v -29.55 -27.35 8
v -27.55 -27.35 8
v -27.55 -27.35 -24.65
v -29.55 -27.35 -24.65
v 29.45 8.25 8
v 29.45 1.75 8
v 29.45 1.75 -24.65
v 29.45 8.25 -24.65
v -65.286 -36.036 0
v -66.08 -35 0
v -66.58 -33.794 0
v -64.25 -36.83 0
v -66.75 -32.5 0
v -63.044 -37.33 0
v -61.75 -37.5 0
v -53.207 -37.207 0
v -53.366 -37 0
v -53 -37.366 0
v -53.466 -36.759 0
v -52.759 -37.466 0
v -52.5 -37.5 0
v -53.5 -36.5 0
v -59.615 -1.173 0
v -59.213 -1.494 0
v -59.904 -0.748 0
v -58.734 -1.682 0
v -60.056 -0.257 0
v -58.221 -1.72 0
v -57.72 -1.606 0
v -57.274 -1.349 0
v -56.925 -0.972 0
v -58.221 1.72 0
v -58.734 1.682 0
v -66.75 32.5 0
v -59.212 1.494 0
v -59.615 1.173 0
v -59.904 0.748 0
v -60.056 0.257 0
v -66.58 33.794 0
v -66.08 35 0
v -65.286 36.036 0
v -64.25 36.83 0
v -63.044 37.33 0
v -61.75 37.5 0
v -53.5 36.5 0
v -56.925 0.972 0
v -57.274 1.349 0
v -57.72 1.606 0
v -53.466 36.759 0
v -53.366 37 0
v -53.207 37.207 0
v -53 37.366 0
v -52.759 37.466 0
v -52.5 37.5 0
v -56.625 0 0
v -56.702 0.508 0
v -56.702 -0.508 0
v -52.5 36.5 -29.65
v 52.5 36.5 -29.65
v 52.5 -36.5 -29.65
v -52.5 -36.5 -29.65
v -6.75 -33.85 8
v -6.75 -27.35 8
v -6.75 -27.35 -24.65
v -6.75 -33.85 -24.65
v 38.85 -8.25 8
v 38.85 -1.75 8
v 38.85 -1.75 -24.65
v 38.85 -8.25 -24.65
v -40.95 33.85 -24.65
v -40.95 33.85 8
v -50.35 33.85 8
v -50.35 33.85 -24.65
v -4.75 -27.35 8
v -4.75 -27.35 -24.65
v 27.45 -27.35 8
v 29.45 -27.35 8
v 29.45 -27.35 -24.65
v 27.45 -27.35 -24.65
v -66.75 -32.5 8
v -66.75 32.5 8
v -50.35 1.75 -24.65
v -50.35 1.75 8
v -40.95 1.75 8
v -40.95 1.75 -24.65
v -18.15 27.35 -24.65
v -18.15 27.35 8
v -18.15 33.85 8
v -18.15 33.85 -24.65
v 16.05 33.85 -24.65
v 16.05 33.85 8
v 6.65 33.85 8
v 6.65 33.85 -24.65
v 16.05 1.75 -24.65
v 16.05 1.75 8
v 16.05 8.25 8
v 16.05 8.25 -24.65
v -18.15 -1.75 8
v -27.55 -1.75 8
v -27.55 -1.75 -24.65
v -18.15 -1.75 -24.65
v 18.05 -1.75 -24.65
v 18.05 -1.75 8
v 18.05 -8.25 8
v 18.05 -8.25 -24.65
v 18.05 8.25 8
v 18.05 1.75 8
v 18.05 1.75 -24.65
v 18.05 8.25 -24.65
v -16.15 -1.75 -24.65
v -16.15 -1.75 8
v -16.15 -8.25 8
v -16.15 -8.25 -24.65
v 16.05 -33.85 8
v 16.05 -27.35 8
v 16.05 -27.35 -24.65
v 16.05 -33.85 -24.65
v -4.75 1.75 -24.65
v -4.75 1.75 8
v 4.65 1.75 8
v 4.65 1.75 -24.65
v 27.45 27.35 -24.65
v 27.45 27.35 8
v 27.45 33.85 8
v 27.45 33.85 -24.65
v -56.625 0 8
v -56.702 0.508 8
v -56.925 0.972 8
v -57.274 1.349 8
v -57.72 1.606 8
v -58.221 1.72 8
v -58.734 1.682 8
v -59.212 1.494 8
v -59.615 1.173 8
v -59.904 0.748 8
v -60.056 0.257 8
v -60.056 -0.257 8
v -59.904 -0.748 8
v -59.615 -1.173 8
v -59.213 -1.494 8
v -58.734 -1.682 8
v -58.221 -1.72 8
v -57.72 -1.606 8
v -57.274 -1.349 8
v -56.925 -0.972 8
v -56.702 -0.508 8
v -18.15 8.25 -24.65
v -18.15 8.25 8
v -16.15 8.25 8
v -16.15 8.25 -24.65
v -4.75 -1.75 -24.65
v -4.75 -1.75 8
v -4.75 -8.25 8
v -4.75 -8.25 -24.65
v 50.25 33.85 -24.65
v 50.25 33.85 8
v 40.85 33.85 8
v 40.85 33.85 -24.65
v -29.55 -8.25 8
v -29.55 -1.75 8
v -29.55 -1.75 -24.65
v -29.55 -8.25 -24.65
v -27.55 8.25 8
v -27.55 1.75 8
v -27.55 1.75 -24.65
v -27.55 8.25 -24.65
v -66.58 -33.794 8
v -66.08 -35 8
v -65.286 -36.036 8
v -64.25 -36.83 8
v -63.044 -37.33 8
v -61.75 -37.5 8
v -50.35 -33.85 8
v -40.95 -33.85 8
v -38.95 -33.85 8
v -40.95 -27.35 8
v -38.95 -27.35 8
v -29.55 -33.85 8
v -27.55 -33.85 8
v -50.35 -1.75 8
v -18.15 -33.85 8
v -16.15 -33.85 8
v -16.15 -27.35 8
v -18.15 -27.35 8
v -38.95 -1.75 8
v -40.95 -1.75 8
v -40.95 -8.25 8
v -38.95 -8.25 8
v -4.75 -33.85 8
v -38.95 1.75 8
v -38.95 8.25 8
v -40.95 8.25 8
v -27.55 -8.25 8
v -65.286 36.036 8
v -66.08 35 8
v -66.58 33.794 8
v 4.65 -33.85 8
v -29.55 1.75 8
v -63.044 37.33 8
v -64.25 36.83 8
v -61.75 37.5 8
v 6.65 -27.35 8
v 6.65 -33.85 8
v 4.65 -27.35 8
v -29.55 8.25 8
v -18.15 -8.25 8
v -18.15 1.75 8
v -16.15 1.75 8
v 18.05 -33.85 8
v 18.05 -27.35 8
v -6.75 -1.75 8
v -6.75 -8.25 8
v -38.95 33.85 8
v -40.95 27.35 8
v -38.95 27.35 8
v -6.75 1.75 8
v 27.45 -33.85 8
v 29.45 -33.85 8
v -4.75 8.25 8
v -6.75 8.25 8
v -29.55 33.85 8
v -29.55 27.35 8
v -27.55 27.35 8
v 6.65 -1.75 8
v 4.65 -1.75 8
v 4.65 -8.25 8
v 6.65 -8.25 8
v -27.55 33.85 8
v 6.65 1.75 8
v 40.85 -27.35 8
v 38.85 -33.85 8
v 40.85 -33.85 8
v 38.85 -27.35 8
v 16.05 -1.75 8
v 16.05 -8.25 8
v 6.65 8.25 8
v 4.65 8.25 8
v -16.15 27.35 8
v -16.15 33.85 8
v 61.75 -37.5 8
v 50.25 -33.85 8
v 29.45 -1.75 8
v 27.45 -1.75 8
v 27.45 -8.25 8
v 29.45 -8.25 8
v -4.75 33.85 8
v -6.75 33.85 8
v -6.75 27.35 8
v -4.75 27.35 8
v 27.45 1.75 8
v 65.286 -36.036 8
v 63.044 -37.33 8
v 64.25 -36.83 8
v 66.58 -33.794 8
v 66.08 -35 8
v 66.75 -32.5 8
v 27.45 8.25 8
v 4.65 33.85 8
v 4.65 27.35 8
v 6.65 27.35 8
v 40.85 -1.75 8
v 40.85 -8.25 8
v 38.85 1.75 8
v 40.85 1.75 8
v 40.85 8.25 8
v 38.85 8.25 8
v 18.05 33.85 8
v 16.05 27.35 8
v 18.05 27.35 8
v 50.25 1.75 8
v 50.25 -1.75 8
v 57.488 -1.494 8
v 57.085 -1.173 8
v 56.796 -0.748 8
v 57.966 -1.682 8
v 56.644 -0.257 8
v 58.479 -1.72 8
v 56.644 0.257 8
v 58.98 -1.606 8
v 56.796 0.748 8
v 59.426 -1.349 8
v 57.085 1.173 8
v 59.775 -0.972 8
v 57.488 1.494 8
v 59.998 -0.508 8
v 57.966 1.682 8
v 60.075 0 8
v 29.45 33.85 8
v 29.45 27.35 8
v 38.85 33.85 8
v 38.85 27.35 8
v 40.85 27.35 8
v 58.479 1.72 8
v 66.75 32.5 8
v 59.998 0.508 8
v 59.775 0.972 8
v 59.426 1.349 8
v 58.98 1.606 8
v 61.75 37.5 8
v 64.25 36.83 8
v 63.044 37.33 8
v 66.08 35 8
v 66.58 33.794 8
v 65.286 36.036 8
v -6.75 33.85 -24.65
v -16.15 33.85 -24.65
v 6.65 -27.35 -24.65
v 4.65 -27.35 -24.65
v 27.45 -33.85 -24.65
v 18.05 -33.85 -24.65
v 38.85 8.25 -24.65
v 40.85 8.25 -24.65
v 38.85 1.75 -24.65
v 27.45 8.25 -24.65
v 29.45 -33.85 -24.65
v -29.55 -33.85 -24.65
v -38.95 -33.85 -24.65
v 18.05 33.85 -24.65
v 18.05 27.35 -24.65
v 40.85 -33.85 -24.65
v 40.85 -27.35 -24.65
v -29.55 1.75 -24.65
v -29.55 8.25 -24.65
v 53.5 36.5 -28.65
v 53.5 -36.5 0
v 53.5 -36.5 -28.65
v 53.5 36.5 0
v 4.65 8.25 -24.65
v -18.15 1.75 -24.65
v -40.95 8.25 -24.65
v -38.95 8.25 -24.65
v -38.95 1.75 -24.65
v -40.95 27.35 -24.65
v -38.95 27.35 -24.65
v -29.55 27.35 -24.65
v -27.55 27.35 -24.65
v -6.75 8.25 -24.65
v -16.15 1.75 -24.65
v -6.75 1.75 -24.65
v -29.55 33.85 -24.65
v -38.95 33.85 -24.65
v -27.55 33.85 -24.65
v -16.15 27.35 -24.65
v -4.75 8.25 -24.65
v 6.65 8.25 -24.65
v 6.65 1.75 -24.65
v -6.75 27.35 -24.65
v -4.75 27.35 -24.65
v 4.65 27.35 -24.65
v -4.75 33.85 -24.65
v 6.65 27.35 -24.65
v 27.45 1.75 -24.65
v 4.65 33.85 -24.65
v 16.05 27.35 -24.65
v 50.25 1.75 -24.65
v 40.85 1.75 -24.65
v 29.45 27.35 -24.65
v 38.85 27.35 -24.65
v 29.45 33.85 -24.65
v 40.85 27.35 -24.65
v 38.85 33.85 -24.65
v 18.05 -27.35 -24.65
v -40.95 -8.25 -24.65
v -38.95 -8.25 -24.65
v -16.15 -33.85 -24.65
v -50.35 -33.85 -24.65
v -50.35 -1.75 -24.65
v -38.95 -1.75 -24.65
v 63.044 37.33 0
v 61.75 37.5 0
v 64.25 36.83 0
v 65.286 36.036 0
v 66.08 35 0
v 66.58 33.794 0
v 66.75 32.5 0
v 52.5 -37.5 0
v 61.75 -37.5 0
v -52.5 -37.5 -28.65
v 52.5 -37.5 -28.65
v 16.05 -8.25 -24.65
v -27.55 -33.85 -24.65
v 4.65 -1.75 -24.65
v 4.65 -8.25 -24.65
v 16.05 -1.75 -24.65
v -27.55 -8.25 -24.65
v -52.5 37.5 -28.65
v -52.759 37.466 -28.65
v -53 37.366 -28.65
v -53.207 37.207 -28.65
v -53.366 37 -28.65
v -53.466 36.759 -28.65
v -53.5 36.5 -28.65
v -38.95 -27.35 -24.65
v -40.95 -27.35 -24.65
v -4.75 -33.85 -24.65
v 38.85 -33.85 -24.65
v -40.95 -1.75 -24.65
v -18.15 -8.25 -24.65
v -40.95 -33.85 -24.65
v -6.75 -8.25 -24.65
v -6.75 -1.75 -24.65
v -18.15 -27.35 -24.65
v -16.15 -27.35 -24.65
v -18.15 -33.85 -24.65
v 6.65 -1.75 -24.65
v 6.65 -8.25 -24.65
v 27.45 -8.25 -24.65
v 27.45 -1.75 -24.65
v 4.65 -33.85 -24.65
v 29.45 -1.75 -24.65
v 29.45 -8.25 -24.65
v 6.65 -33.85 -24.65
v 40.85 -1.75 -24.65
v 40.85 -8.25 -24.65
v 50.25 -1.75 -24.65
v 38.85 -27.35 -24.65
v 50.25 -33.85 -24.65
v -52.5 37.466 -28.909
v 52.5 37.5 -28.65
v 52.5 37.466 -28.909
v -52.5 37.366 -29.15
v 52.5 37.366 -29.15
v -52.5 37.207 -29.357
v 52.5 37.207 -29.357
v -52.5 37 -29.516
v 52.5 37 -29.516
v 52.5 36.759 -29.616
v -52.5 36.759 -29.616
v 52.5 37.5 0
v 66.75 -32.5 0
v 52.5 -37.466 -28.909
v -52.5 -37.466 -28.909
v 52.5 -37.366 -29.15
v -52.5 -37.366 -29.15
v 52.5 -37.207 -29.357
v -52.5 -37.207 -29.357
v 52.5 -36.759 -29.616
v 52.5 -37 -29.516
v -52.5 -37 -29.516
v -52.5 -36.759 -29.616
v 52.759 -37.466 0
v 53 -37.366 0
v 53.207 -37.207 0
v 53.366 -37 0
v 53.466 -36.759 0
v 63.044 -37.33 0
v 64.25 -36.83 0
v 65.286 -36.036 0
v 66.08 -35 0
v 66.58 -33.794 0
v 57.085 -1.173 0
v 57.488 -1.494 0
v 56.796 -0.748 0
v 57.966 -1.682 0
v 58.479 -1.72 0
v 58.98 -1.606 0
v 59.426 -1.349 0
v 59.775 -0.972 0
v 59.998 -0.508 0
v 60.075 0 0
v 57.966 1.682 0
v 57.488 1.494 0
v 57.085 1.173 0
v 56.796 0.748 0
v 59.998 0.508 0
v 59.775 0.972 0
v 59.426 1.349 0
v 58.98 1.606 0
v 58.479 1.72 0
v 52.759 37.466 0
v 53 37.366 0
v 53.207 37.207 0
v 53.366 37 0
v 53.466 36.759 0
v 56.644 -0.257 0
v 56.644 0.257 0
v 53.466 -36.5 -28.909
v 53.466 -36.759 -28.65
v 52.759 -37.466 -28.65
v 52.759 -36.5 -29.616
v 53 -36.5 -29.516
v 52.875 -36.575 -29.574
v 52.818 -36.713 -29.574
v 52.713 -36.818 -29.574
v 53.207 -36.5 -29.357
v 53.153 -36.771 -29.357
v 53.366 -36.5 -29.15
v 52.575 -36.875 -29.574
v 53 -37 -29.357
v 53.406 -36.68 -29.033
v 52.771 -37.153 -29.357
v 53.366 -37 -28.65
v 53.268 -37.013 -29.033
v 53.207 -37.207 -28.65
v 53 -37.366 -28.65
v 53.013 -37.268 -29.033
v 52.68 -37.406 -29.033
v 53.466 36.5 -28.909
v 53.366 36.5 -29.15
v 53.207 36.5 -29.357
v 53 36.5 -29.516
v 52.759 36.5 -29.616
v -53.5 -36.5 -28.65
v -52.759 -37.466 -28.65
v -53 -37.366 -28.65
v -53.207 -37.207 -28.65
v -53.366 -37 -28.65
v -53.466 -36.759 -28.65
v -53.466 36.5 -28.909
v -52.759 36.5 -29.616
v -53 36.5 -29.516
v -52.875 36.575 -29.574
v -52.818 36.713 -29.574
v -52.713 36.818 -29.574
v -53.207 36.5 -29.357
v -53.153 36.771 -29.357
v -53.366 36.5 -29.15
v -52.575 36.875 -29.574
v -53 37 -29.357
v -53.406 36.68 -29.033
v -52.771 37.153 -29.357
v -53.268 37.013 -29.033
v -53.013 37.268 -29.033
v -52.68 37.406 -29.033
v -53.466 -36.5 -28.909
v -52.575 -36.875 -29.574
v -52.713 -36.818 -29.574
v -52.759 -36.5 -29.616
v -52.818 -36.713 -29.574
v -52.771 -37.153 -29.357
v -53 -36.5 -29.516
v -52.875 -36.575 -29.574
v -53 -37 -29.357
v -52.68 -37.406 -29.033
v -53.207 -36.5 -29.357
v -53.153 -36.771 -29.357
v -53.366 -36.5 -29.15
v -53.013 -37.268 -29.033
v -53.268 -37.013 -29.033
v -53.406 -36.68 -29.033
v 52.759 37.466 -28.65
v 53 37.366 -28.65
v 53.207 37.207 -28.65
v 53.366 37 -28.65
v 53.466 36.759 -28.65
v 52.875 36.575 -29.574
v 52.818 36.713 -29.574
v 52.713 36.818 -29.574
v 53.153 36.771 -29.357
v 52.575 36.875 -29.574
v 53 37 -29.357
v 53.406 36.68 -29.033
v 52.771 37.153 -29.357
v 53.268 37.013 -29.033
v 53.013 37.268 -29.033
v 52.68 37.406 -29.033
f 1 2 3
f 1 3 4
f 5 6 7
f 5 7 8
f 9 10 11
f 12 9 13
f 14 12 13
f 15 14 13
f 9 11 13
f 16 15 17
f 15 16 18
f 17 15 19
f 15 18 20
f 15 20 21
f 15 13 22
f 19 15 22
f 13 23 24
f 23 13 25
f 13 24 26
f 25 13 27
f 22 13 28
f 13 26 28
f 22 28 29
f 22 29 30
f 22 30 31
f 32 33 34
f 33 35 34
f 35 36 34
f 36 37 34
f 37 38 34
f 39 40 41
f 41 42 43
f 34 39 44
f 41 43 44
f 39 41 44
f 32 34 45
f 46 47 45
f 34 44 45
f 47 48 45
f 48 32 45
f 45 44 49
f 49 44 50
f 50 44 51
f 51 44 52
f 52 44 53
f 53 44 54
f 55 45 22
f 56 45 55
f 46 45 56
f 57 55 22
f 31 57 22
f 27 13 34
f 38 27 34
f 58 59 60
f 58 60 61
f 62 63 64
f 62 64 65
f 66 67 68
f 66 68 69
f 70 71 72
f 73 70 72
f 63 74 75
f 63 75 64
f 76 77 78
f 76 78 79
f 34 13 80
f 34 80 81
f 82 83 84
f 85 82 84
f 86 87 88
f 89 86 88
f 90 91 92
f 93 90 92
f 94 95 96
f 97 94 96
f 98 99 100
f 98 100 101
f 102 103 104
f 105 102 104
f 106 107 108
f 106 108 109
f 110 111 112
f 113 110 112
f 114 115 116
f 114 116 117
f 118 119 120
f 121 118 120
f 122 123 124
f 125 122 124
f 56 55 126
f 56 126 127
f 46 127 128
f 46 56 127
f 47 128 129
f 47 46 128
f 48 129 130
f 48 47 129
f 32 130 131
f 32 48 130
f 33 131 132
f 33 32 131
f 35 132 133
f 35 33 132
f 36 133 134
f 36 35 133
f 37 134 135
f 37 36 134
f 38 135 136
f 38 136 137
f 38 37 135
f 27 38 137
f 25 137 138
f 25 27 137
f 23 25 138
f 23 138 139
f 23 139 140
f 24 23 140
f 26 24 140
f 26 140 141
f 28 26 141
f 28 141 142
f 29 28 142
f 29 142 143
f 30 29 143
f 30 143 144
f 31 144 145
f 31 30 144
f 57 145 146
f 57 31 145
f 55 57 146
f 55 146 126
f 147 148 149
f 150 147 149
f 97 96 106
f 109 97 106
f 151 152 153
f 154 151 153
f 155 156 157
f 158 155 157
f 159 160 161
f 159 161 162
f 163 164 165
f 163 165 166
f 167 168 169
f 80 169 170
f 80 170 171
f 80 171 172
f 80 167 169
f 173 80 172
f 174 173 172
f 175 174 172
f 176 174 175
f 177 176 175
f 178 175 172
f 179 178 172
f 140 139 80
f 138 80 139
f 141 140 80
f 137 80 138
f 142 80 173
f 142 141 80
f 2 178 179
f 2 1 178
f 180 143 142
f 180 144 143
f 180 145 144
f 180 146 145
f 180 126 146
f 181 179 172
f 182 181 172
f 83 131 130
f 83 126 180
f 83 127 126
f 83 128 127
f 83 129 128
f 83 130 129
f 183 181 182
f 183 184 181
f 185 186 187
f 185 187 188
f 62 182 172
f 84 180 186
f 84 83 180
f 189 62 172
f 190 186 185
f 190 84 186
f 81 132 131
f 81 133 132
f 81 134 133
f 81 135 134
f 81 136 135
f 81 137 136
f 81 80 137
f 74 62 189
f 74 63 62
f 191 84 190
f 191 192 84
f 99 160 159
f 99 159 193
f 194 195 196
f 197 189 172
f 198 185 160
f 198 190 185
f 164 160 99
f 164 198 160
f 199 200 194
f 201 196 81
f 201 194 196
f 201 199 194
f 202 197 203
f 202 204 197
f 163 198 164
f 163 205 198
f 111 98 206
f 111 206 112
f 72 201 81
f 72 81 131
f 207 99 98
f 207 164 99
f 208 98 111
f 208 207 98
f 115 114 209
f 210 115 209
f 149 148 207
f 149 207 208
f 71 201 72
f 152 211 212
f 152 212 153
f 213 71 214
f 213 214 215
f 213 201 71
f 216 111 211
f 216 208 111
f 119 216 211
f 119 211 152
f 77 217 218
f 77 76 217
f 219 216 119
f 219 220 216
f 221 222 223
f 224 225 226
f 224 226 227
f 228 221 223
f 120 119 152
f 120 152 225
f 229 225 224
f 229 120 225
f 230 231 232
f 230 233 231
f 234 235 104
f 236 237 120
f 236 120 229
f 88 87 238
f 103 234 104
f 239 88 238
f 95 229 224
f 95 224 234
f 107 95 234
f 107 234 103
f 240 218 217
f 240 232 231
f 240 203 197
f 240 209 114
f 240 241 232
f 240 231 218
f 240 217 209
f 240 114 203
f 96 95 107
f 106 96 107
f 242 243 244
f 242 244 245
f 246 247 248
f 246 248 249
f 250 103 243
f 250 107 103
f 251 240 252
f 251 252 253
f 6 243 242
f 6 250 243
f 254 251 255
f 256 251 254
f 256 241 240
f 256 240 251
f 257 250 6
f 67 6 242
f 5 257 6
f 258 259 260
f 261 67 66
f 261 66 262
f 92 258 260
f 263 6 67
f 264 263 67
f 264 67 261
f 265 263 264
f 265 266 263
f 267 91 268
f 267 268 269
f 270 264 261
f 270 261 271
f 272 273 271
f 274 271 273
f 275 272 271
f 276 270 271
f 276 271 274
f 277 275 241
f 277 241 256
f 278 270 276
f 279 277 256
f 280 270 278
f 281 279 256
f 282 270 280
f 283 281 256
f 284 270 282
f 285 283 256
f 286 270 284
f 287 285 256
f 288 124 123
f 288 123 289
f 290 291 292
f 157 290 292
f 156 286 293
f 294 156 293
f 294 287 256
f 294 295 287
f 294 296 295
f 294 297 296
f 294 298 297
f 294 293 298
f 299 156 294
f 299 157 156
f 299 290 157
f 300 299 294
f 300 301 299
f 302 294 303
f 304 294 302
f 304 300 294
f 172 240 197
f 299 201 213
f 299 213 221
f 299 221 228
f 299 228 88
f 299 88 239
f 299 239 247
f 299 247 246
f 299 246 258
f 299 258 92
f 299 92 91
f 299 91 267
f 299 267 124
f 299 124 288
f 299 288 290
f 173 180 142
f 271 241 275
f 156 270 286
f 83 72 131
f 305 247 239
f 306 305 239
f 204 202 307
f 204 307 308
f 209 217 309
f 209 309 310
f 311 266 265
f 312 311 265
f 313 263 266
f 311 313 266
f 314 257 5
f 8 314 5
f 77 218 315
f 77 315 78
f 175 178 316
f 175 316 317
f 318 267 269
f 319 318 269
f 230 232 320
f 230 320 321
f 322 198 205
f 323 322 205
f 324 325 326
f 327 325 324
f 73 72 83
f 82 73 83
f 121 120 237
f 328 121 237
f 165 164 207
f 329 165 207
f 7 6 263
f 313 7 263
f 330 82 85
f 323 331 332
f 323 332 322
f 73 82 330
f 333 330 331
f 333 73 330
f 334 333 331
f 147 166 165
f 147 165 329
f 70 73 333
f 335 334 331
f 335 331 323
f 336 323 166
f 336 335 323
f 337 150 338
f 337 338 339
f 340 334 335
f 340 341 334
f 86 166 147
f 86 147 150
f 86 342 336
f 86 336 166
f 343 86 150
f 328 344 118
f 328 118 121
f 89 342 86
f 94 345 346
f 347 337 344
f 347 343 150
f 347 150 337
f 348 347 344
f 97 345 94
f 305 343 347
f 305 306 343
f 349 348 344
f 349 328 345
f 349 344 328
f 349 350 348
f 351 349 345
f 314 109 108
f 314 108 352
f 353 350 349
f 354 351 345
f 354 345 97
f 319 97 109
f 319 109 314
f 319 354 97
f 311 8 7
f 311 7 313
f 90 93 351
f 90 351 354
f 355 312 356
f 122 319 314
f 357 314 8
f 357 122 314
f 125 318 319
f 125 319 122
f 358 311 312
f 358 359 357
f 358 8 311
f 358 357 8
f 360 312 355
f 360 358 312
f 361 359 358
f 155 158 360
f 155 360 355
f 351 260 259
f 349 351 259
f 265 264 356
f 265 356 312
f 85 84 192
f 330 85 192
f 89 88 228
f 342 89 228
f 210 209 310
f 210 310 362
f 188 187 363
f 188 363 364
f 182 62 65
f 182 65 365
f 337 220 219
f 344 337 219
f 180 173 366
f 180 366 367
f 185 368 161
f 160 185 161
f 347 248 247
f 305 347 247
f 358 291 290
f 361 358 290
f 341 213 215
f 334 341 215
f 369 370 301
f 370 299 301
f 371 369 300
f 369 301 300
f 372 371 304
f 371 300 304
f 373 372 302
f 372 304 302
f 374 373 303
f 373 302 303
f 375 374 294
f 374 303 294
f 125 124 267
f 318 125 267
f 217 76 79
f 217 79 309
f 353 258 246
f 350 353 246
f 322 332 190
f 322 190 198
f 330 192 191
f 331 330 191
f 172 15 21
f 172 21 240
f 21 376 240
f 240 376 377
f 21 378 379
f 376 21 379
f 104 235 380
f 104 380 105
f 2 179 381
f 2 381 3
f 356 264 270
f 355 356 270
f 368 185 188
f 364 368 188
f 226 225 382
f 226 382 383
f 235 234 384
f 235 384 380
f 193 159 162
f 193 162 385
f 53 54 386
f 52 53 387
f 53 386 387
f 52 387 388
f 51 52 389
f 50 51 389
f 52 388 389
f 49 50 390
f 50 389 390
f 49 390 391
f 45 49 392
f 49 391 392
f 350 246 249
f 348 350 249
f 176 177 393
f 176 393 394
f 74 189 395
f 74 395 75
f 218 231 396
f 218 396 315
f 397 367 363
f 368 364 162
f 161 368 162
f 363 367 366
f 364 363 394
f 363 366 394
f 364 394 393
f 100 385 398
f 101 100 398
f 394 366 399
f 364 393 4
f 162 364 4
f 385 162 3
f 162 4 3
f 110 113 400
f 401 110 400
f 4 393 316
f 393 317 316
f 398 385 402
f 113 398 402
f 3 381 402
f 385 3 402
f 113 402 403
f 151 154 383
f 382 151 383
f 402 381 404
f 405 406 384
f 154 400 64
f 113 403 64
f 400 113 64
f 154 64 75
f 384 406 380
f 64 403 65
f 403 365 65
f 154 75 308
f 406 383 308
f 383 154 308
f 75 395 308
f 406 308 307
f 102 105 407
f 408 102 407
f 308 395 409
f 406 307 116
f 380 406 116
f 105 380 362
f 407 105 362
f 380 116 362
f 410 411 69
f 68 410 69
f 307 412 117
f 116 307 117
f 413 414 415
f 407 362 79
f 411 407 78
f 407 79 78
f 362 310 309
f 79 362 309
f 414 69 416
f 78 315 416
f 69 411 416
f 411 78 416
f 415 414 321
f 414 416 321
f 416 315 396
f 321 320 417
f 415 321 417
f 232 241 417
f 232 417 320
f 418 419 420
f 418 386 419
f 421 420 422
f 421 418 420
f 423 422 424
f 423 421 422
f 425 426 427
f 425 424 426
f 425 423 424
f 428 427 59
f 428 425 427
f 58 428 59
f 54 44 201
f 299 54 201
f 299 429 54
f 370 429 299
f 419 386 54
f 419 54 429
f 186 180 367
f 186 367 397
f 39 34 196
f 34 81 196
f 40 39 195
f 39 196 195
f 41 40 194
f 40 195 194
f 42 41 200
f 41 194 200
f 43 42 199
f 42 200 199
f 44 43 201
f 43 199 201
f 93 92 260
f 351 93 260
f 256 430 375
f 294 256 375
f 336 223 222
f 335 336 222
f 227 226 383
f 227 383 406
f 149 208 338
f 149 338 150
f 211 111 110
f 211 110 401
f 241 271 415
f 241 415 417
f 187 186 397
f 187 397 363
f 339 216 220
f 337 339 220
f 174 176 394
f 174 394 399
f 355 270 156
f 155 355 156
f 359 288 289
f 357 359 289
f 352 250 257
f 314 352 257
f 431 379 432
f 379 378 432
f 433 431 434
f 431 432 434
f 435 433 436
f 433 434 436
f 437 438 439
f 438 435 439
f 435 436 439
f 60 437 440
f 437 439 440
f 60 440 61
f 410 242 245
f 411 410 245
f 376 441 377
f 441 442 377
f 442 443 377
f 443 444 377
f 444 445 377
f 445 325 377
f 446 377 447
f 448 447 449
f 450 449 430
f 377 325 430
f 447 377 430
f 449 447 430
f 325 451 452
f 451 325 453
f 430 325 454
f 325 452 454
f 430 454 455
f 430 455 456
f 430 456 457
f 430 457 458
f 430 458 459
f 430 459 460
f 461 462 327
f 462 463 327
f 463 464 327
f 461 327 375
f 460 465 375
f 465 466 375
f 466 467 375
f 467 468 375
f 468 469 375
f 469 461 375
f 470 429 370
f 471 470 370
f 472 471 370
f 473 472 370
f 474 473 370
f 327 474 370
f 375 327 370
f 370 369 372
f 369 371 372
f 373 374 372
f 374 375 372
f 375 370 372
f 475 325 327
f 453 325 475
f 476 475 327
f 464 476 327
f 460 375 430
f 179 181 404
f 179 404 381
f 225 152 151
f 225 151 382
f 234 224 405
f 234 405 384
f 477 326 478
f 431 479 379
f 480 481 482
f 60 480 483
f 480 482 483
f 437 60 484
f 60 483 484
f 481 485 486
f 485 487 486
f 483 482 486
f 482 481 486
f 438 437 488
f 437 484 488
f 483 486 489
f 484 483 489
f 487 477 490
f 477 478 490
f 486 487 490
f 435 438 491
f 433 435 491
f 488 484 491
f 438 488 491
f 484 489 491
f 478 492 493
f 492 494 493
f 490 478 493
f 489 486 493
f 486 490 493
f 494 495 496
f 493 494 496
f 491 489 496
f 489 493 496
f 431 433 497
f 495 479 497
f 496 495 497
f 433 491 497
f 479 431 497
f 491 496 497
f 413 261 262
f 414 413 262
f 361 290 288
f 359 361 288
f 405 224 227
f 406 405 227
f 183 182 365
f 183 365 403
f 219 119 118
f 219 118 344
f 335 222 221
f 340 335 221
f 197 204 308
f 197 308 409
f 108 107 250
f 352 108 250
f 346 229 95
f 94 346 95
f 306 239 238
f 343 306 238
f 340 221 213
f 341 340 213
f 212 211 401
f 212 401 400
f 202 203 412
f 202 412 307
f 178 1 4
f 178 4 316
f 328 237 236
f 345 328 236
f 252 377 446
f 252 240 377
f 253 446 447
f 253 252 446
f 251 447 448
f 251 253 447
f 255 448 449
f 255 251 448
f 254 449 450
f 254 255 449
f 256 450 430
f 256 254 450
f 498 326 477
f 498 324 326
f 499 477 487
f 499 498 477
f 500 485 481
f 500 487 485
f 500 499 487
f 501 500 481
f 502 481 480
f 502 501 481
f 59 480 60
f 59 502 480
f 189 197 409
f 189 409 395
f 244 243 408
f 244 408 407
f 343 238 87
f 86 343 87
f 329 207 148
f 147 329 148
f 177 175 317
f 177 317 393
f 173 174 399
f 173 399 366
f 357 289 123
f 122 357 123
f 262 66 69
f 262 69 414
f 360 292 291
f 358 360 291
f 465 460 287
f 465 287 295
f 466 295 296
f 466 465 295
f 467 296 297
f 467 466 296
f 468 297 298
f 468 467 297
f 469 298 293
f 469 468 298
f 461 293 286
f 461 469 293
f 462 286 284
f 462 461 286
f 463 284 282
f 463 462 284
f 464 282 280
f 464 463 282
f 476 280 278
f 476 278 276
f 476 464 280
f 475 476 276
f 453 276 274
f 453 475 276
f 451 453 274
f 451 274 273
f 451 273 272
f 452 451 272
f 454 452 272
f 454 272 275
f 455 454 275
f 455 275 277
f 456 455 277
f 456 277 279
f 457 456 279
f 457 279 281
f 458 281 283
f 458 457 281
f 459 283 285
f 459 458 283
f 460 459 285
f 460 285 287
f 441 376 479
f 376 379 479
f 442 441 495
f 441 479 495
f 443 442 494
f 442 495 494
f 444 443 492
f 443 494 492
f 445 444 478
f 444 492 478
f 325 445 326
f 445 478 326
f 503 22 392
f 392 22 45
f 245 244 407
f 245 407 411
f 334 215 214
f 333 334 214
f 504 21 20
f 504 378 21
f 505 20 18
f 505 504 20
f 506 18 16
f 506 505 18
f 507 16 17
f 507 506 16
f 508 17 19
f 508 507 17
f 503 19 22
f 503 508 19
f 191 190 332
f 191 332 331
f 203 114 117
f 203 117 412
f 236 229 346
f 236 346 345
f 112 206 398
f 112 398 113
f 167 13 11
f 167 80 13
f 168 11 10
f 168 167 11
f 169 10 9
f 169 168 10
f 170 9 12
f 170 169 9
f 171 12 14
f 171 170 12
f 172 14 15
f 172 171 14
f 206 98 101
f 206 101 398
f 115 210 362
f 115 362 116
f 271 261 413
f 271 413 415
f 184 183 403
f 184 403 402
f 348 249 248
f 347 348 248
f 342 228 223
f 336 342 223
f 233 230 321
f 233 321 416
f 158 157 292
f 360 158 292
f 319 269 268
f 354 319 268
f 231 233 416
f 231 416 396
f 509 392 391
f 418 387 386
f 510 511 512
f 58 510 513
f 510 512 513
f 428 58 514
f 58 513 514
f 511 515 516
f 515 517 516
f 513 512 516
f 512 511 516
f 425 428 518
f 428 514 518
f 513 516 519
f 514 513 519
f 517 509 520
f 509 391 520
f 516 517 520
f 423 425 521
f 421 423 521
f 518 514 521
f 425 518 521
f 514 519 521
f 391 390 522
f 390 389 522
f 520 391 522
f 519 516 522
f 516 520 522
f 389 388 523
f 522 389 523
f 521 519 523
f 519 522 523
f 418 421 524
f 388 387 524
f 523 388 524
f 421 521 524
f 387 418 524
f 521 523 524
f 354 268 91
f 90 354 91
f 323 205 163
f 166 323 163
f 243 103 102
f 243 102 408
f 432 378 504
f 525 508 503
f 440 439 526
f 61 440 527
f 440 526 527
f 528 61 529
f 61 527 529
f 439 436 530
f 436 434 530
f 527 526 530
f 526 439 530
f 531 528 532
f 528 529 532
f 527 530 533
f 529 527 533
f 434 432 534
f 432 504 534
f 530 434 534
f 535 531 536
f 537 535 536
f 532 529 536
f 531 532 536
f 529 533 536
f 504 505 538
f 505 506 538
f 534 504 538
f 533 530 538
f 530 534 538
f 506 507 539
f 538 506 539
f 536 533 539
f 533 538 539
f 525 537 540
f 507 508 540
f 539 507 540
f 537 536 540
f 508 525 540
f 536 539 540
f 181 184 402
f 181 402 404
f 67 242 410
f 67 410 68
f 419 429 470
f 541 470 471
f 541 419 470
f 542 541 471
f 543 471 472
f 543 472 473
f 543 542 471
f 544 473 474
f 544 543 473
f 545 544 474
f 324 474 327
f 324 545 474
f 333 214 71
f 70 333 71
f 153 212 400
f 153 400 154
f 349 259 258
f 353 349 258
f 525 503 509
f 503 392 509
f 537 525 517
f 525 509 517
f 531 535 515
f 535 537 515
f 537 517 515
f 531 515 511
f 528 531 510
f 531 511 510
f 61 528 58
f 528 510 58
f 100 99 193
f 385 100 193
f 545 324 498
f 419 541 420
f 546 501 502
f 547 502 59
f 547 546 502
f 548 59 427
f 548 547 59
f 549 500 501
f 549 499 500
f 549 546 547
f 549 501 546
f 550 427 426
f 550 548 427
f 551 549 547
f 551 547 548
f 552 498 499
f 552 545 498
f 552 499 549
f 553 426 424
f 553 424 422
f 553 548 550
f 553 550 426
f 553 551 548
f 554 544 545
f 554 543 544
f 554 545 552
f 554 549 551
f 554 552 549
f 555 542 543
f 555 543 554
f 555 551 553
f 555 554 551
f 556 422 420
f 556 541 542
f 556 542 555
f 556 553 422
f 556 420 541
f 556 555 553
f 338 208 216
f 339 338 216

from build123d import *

# Parameters (mm, degrees)
SKETCH1_W           = 133.5
SKETCH1_H           = 75
SKETCH1_R           = 1.725
BOSS_EXTRUDE1_DEPTH = 8
SKETCH2_W           = 107
SKETCH2_H           = 75
BOSS_EXTRUDE2_DEPTH = 29.65
CUT_EXTRUDE1_DEPTH  = 32.65
SKETCH4_W           = 2
SKETCH4_H           = 6.5
BOSS_EXTRUDE3_DEPTH = 32.65
FILLET1_R           = 5
FILLET4_R           = 1


with BuildPart() as part:
    # Sketch1 → Boss-Extrude1 (new body)
    with BuildSketch(Plane.XY):
        Rectangle(SKETCH1_W, SKETCH1_H)
        with Locations((-58.35, 0)):
            Circle(SKETCH1_R, mode=Mode.SUBTRACT)
        with Locations((58.35, 0)):
            Circle(SKETCH1_R, mode=Mode.SUBTRACT)
    extrude(amount=BOSS_EXTRUDE1_DEPTH)

    # Sketch2 → Boss-Extrude2 (add)
    with BuildSketch(Plane(origin=(0, 0, 0), x_dir=(-1, 0, 0), z_dir=(0, 0, -1))):
        Rectangle(SKETCH2_W, SKETCH2_H)
    extrude(amount=BOSS_EXTRUDE2_DEPTH)

    # Sketch3 → Cut-Extrude1 (cut)
    with BuildSketch(Plane.XY.offset(8)):
        Polygon((-38.95, 33.85), (-38.95, 27.35), (-40.95, 27.35), (-40.95, 33.85), (-50.35, 33.85), (-50.35, 1.75), (50.25, 1.75), (50.25, 33.85), (40.85, 33.85), (40.85, 27.35), (38.85, 27.35), (38.85, 33.85), (29.45, 33.85), (29.45, 27.35), (27.45, 27.35), (27.45, 33.85), (18.05, 33.85), (18.05, 27.35), (16.05, 27.35), (16.05, 33.85), (6.65, 33.85), (6.65, 27.35), (4.65, 27.35), (4.65, 33.85), (-4.75, 33.85), (-4.75, 27.35), (-6.75, 27.35), (-6.75, 33.85), (-16.15, 33.85), (-16.15, 27.35), (-18.15, 27.35), (-18.15, 33.85), (-27.55, 33.85), (-27.55, 27.35), (-29.55, 27.35), (-29.55, 33.85), align=None)
    cut_extrude1 = extrude(amount=-CUT_EXTRUDE1_DEPTH, mode=Mode.SUBTRACT)

    # Mirror1: Cut-Extrude1 across plane
    add(cut_extrude1.mirror(Plane.ZX), mode=Mode.SUBTRACT)

    # Sketch4 → Boss-Extrude3 (add)
    with BuildSketch(Plane.XY.offset(8)):
        with Locations((-39.95, 5)):
            Rectangle(SKETCH4_W, SKETCH4_H)
        with Locations((-28.55, 5)):
            Rectangle(SKETCH4_W, SKETCH4_H)
        with Locations((-17.15, 5)):
            Rectangle(SKETCH4_W, SKETCH4_H)
        with Locations((-5.75, 5)):
            Rectangle(SKETCH4_W, SKETCH4_H)
        with Locations((5.65, 5)):
            Rectangle(SKETCH4_W, SKETCH4_H)
        with Locations((17.05, 5)):
            Rectangle(SKETCH4_W, SKETCH4_H)
        with Locations((28.45, 5)):
            Rectangle(SKETCH4_W, SKETCH4_H)
        with Locations((39.85, 5)):
            Rectangle(SKETCH4_W, SKETCH4_H)
    boss_extrude3 = extrude(amount=-BOSS_EXTRUDE3_DEPTH)

    # Mirror2: Boss-Extrude3 across plane
    add(boss_extrude3.mirror(Plane.ZX))

    # Fillet1
    fillet1_edges = [part.edges().sort_by_distance(p)[0] for p in [
        (-66.75, 37.5, 4),
        (66.75, 37.5, 4),
        (66.75, -37.5, 4),
        (-66.75, -37.5, 4),
    ]]
    fillet(fillet1_edges, radius=FILLET1_R)

    # Fillet4
    fillet4_edges = [part.edges().sort_by_distance(p)[0] for p in [
        (53.5, 37.5, -14.825),
        (53.5, -37.5, -14.825),
        (-53.5, -37.5, -14.825),
        (-53.5, 37.5, -14.825),
        (53.5, 0, -29.65),
        (0, -37.5, -29.65),
        (-53.5, 0, -29.65),
        (0, 37.5, -29.65),
    ]]
    fillet(fillet4_edges, radius=FILLET4_R)


solid = part.part
